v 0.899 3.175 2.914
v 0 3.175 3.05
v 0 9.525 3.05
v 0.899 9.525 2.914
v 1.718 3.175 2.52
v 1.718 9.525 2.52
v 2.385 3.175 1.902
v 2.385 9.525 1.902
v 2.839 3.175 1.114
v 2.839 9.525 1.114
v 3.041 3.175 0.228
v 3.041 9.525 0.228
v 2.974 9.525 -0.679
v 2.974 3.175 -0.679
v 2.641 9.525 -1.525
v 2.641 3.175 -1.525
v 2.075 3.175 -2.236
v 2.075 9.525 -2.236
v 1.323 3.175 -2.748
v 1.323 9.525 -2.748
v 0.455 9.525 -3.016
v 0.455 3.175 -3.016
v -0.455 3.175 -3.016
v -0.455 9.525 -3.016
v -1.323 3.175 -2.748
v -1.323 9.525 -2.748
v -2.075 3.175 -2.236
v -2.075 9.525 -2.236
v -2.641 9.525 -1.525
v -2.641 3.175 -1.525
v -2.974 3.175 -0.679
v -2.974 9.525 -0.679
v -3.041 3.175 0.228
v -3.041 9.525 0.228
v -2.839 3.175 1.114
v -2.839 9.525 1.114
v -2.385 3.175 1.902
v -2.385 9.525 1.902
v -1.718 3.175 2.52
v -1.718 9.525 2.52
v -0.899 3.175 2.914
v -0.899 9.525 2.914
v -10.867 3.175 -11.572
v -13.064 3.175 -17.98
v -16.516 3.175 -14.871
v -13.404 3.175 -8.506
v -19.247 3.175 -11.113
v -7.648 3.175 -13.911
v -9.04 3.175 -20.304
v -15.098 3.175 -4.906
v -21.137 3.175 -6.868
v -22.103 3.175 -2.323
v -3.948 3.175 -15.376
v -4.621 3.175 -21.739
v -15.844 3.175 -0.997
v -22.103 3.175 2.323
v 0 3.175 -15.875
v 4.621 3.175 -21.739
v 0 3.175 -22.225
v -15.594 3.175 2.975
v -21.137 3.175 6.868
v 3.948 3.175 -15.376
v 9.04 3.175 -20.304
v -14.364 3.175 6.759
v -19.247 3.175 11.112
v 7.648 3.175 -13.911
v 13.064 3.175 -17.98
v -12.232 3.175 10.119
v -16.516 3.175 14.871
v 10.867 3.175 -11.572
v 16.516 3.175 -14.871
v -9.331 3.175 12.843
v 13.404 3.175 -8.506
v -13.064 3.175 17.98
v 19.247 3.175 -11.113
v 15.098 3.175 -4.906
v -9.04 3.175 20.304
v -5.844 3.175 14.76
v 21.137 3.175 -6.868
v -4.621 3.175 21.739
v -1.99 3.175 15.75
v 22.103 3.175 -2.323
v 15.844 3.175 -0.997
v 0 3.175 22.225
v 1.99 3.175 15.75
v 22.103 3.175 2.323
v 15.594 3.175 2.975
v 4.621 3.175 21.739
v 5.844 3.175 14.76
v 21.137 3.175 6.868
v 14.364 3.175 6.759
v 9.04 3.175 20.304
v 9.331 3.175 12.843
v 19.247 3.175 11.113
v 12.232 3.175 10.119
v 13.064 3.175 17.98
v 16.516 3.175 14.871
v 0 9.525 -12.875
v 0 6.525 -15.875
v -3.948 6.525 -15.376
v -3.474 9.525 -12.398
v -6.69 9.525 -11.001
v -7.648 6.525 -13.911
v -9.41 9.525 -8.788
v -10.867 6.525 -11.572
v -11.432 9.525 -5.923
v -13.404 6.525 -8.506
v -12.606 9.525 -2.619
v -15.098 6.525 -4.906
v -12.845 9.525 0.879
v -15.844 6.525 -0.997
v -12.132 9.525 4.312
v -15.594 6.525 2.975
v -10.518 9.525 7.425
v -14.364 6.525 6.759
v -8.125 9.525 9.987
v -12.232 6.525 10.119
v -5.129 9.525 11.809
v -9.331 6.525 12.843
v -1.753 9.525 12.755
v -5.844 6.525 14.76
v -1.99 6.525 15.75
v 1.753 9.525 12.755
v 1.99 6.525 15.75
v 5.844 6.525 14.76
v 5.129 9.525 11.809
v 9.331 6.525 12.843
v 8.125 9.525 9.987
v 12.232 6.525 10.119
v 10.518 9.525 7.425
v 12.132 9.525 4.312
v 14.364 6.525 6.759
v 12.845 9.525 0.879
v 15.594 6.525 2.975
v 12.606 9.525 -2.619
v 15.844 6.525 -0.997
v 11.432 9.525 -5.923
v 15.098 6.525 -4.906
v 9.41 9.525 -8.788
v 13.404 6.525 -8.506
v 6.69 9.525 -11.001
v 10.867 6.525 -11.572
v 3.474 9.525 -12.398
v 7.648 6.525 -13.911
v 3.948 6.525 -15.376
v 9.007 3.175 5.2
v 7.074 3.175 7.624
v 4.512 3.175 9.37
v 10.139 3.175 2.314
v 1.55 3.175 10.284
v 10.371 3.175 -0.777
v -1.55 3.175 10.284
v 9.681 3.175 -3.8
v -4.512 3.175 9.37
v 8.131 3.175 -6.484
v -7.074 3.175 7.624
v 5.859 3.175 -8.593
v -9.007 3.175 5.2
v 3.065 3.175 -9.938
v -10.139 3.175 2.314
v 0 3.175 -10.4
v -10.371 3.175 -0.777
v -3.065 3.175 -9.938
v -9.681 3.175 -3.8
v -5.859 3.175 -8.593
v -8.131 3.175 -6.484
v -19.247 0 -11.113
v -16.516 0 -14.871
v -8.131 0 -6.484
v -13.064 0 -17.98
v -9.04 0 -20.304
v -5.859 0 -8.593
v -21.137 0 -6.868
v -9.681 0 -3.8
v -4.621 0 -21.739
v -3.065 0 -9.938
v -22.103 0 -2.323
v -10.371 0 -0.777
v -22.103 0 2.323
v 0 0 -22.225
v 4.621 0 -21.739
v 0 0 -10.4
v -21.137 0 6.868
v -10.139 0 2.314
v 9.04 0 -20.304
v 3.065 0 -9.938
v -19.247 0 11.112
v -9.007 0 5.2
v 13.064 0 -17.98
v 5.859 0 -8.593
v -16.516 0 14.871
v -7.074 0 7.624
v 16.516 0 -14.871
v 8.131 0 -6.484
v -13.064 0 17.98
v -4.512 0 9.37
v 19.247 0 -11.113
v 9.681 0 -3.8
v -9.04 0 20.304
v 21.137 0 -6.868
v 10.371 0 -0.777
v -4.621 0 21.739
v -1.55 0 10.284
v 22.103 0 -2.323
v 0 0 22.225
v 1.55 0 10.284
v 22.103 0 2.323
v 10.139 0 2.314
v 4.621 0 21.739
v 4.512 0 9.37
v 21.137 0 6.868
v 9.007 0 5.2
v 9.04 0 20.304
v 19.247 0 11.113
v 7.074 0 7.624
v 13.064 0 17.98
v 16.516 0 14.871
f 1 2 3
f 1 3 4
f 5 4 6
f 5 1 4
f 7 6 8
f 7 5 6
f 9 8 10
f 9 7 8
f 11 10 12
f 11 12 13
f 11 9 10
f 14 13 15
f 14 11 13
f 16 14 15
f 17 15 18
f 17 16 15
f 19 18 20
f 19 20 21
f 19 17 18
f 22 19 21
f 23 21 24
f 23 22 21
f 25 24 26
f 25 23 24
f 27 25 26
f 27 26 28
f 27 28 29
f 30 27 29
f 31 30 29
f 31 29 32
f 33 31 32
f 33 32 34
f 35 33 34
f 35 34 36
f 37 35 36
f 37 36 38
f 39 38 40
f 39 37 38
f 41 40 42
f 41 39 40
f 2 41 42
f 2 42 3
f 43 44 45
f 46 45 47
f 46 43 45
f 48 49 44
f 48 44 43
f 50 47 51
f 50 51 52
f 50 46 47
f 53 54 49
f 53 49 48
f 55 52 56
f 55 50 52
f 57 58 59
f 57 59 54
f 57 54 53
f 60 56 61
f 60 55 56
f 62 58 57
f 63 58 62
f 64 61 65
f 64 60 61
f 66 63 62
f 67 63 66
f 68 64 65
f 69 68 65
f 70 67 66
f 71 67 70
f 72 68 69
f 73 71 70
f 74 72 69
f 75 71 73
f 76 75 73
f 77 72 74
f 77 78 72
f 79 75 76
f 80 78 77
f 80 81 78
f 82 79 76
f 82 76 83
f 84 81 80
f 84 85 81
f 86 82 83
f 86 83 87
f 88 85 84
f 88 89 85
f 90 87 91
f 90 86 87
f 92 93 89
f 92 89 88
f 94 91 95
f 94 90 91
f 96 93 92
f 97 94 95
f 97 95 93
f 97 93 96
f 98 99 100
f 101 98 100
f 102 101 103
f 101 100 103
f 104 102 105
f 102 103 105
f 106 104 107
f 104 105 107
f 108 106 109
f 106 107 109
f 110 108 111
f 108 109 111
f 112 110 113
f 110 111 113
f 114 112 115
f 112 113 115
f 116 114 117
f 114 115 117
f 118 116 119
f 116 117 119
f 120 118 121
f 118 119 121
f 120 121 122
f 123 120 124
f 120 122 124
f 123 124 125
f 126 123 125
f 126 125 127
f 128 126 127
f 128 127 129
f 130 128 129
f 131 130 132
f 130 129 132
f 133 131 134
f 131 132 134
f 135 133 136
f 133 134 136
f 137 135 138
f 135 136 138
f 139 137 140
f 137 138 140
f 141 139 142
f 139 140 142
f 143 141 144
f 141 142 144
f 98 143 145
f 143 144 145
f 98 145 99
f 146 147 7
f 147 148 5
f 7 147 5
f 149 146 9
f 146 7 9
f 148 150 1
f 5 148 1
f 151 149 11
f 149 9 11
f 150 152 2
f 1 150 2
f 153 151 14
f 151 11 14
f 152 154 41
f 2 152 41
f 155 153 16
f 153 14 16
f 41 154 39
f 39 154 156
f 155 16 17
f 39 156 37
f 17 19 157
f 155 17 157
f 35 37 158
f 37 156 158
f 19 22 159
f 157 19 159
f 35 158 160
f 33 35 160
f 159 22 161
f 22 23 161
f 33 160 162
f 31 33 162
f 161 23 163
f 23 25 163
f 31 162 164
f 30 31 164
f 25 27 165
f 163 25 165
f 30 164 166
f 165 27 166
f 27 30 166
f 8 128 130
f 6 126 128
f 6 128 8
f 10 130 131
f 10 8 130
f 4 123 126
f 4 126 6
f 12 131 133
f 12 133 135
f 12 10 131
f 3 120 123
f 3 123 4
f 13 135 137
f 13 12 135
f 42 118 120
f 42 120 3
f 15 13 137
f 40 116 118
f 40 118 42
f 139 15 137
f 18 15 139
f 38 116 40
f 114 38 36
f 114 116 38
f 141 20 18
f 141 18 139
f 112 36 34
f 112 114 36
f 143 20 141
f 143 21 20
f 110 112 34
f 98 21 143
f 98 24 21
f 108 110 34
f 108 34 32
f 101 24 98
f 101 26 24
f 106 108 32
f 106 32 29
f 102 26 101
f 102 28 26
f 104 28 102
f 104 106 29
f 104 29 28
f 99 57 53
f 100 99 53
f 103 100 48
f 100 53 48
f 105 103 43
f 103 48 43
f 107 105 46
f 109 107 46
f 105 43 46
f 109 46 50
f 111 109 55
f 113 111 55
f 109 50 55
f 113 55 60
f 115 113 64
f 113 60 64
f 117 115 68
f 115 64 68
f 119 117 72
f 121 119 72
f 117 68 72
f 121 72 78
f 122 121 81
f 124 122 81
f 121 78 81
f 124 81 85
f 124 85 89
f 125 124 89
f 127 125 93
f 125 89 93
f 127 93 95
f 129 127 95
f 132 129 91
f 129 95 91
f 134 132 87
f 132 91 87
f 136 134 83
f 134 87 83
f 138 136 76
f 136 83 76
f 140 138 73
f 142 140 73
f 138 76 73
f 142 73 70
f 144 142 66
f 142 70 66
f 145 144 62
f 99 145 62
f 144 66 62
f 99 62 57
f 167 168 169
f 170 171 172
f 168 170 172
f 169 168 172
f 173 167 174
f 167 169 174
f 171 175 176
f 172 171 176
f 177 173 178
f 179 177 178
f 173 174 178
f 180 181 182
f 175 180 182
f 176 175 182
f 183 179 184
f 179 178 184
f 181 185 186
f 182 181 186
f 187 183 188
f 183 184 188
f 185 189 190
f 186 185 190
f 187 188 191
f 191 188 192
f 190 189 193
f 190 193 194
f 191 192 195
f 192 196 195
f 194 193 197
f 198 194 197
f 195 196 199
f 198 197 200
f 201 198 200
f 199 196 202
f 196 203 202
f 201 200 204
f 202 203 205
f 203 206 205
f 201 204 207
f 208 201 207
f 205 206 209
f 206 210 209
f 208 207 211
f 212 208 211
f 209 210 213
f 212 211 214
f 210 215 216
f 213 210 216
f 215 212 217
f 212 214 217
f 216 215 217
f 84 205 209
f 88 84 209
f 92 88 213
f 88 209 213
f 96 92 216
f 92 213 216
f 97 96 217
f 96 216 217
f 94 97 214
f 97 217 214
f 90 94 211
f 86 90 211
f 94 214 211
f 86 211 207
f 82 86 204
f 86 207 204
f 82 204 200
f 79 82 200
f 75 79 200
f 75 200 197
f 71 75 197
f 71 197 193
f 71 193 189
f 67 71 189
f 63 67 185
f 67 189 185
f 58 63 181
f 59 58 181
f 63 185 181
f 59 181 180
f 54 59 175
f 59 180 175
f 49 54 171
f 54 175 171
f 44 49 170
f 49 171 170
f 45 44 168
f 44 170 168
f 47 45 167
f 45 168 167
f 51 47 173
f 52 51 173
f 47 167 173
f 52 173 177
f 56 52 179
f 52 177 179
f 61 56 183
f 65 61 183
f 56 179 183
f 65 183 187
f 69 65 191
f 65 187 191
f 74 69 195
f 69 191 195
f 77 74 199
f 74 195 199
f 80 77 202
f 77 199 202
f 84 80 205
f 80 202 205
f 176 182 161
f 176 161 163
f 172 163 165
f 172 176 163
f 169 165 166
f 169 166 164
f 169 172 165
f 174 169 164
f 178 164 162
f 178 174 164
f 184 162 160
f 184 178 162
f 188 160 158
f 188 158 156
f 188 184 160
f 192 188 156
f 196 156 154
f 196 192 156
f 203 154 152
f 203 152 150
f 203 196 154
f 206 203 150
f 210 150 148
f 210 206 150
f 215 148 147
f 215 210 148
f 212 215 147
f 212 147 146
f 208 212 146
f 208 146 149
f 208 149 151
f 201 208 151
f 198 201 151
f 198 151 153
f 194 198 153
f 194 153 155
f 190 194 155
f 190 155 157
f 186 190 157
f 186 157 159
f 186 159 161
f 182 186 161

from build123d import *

# Parameters (mm, degrees)
SKETCH1_R           = 22.225
SKETCH1_R_2         = 15.875
BOSS_EXTRUDE1_DEPTH = 3.175
SKETCH1_4_R         = 15.875
SKETCH1_4_R_2       = 10.4
BOSS_EXTRUDE2_DEPTH = 9.525
BOSS_EXTRUDE3_START = -6.35
SKETCH2_R           = 10.4
SKETCH2_R_2         = 3.05
BOSS_EXTRUDE3_DEPTH = 6.35
CHAMFER2_SIZE       = 3


with BuildPart() as part:
    # Sketch1 → Boss-Extrude1 (new body)
    with BuildSketch(Plane(origin=(0, 0, 0), x_dir=(1, 0, 0), z_dir=(0, 1, 0))):
        Circle(SKETCH1_R)
        Circle(SKETCH1_R_2, mode=Mode.SUBTRACT)
    extrude(amount=BOSS_EXTRUDE1_DEPTH)

    # Sketch1<4> → Boss-Extrude2 (add)
    with BuildSketch(Plane(origin=(0, 0, 0), x_dir=(1, 0, 0), z_dir=(0, 1, 0))):
        Circle(SKETCH1_4_R)
        Circle(SKETCH1_4_R_2, mode=Mode.SUBTRACT)
    extrude(amount=BOSS_EXTRUDE2_DEPTH)

    # Sketch2 → Boss-Extrude3 (add)
    with BuildSketch(Plane(origin=(0, 9.525, 0), x_dir=(1, 0, 0), z_dir=(0, 1, 0)).offset(BOSS_EXTRUDE3_START)):
        Circle(SKETCH2_R)
        Circle(SKETCH2_R_2, mode=Mode.SUBTRACT)
    extrude(amount=BOSS_EXTRUDE3_DEPTH)

    # Chamfer2
    chamfer2_edges = [part.edges().sort_by_distance(p)[0] for p in [
        (-15.875, 9.525, 0),
    ]]
    chamfer(chamfer2_edges, length=CHAMFER2_SIZE)


solid = part.part
